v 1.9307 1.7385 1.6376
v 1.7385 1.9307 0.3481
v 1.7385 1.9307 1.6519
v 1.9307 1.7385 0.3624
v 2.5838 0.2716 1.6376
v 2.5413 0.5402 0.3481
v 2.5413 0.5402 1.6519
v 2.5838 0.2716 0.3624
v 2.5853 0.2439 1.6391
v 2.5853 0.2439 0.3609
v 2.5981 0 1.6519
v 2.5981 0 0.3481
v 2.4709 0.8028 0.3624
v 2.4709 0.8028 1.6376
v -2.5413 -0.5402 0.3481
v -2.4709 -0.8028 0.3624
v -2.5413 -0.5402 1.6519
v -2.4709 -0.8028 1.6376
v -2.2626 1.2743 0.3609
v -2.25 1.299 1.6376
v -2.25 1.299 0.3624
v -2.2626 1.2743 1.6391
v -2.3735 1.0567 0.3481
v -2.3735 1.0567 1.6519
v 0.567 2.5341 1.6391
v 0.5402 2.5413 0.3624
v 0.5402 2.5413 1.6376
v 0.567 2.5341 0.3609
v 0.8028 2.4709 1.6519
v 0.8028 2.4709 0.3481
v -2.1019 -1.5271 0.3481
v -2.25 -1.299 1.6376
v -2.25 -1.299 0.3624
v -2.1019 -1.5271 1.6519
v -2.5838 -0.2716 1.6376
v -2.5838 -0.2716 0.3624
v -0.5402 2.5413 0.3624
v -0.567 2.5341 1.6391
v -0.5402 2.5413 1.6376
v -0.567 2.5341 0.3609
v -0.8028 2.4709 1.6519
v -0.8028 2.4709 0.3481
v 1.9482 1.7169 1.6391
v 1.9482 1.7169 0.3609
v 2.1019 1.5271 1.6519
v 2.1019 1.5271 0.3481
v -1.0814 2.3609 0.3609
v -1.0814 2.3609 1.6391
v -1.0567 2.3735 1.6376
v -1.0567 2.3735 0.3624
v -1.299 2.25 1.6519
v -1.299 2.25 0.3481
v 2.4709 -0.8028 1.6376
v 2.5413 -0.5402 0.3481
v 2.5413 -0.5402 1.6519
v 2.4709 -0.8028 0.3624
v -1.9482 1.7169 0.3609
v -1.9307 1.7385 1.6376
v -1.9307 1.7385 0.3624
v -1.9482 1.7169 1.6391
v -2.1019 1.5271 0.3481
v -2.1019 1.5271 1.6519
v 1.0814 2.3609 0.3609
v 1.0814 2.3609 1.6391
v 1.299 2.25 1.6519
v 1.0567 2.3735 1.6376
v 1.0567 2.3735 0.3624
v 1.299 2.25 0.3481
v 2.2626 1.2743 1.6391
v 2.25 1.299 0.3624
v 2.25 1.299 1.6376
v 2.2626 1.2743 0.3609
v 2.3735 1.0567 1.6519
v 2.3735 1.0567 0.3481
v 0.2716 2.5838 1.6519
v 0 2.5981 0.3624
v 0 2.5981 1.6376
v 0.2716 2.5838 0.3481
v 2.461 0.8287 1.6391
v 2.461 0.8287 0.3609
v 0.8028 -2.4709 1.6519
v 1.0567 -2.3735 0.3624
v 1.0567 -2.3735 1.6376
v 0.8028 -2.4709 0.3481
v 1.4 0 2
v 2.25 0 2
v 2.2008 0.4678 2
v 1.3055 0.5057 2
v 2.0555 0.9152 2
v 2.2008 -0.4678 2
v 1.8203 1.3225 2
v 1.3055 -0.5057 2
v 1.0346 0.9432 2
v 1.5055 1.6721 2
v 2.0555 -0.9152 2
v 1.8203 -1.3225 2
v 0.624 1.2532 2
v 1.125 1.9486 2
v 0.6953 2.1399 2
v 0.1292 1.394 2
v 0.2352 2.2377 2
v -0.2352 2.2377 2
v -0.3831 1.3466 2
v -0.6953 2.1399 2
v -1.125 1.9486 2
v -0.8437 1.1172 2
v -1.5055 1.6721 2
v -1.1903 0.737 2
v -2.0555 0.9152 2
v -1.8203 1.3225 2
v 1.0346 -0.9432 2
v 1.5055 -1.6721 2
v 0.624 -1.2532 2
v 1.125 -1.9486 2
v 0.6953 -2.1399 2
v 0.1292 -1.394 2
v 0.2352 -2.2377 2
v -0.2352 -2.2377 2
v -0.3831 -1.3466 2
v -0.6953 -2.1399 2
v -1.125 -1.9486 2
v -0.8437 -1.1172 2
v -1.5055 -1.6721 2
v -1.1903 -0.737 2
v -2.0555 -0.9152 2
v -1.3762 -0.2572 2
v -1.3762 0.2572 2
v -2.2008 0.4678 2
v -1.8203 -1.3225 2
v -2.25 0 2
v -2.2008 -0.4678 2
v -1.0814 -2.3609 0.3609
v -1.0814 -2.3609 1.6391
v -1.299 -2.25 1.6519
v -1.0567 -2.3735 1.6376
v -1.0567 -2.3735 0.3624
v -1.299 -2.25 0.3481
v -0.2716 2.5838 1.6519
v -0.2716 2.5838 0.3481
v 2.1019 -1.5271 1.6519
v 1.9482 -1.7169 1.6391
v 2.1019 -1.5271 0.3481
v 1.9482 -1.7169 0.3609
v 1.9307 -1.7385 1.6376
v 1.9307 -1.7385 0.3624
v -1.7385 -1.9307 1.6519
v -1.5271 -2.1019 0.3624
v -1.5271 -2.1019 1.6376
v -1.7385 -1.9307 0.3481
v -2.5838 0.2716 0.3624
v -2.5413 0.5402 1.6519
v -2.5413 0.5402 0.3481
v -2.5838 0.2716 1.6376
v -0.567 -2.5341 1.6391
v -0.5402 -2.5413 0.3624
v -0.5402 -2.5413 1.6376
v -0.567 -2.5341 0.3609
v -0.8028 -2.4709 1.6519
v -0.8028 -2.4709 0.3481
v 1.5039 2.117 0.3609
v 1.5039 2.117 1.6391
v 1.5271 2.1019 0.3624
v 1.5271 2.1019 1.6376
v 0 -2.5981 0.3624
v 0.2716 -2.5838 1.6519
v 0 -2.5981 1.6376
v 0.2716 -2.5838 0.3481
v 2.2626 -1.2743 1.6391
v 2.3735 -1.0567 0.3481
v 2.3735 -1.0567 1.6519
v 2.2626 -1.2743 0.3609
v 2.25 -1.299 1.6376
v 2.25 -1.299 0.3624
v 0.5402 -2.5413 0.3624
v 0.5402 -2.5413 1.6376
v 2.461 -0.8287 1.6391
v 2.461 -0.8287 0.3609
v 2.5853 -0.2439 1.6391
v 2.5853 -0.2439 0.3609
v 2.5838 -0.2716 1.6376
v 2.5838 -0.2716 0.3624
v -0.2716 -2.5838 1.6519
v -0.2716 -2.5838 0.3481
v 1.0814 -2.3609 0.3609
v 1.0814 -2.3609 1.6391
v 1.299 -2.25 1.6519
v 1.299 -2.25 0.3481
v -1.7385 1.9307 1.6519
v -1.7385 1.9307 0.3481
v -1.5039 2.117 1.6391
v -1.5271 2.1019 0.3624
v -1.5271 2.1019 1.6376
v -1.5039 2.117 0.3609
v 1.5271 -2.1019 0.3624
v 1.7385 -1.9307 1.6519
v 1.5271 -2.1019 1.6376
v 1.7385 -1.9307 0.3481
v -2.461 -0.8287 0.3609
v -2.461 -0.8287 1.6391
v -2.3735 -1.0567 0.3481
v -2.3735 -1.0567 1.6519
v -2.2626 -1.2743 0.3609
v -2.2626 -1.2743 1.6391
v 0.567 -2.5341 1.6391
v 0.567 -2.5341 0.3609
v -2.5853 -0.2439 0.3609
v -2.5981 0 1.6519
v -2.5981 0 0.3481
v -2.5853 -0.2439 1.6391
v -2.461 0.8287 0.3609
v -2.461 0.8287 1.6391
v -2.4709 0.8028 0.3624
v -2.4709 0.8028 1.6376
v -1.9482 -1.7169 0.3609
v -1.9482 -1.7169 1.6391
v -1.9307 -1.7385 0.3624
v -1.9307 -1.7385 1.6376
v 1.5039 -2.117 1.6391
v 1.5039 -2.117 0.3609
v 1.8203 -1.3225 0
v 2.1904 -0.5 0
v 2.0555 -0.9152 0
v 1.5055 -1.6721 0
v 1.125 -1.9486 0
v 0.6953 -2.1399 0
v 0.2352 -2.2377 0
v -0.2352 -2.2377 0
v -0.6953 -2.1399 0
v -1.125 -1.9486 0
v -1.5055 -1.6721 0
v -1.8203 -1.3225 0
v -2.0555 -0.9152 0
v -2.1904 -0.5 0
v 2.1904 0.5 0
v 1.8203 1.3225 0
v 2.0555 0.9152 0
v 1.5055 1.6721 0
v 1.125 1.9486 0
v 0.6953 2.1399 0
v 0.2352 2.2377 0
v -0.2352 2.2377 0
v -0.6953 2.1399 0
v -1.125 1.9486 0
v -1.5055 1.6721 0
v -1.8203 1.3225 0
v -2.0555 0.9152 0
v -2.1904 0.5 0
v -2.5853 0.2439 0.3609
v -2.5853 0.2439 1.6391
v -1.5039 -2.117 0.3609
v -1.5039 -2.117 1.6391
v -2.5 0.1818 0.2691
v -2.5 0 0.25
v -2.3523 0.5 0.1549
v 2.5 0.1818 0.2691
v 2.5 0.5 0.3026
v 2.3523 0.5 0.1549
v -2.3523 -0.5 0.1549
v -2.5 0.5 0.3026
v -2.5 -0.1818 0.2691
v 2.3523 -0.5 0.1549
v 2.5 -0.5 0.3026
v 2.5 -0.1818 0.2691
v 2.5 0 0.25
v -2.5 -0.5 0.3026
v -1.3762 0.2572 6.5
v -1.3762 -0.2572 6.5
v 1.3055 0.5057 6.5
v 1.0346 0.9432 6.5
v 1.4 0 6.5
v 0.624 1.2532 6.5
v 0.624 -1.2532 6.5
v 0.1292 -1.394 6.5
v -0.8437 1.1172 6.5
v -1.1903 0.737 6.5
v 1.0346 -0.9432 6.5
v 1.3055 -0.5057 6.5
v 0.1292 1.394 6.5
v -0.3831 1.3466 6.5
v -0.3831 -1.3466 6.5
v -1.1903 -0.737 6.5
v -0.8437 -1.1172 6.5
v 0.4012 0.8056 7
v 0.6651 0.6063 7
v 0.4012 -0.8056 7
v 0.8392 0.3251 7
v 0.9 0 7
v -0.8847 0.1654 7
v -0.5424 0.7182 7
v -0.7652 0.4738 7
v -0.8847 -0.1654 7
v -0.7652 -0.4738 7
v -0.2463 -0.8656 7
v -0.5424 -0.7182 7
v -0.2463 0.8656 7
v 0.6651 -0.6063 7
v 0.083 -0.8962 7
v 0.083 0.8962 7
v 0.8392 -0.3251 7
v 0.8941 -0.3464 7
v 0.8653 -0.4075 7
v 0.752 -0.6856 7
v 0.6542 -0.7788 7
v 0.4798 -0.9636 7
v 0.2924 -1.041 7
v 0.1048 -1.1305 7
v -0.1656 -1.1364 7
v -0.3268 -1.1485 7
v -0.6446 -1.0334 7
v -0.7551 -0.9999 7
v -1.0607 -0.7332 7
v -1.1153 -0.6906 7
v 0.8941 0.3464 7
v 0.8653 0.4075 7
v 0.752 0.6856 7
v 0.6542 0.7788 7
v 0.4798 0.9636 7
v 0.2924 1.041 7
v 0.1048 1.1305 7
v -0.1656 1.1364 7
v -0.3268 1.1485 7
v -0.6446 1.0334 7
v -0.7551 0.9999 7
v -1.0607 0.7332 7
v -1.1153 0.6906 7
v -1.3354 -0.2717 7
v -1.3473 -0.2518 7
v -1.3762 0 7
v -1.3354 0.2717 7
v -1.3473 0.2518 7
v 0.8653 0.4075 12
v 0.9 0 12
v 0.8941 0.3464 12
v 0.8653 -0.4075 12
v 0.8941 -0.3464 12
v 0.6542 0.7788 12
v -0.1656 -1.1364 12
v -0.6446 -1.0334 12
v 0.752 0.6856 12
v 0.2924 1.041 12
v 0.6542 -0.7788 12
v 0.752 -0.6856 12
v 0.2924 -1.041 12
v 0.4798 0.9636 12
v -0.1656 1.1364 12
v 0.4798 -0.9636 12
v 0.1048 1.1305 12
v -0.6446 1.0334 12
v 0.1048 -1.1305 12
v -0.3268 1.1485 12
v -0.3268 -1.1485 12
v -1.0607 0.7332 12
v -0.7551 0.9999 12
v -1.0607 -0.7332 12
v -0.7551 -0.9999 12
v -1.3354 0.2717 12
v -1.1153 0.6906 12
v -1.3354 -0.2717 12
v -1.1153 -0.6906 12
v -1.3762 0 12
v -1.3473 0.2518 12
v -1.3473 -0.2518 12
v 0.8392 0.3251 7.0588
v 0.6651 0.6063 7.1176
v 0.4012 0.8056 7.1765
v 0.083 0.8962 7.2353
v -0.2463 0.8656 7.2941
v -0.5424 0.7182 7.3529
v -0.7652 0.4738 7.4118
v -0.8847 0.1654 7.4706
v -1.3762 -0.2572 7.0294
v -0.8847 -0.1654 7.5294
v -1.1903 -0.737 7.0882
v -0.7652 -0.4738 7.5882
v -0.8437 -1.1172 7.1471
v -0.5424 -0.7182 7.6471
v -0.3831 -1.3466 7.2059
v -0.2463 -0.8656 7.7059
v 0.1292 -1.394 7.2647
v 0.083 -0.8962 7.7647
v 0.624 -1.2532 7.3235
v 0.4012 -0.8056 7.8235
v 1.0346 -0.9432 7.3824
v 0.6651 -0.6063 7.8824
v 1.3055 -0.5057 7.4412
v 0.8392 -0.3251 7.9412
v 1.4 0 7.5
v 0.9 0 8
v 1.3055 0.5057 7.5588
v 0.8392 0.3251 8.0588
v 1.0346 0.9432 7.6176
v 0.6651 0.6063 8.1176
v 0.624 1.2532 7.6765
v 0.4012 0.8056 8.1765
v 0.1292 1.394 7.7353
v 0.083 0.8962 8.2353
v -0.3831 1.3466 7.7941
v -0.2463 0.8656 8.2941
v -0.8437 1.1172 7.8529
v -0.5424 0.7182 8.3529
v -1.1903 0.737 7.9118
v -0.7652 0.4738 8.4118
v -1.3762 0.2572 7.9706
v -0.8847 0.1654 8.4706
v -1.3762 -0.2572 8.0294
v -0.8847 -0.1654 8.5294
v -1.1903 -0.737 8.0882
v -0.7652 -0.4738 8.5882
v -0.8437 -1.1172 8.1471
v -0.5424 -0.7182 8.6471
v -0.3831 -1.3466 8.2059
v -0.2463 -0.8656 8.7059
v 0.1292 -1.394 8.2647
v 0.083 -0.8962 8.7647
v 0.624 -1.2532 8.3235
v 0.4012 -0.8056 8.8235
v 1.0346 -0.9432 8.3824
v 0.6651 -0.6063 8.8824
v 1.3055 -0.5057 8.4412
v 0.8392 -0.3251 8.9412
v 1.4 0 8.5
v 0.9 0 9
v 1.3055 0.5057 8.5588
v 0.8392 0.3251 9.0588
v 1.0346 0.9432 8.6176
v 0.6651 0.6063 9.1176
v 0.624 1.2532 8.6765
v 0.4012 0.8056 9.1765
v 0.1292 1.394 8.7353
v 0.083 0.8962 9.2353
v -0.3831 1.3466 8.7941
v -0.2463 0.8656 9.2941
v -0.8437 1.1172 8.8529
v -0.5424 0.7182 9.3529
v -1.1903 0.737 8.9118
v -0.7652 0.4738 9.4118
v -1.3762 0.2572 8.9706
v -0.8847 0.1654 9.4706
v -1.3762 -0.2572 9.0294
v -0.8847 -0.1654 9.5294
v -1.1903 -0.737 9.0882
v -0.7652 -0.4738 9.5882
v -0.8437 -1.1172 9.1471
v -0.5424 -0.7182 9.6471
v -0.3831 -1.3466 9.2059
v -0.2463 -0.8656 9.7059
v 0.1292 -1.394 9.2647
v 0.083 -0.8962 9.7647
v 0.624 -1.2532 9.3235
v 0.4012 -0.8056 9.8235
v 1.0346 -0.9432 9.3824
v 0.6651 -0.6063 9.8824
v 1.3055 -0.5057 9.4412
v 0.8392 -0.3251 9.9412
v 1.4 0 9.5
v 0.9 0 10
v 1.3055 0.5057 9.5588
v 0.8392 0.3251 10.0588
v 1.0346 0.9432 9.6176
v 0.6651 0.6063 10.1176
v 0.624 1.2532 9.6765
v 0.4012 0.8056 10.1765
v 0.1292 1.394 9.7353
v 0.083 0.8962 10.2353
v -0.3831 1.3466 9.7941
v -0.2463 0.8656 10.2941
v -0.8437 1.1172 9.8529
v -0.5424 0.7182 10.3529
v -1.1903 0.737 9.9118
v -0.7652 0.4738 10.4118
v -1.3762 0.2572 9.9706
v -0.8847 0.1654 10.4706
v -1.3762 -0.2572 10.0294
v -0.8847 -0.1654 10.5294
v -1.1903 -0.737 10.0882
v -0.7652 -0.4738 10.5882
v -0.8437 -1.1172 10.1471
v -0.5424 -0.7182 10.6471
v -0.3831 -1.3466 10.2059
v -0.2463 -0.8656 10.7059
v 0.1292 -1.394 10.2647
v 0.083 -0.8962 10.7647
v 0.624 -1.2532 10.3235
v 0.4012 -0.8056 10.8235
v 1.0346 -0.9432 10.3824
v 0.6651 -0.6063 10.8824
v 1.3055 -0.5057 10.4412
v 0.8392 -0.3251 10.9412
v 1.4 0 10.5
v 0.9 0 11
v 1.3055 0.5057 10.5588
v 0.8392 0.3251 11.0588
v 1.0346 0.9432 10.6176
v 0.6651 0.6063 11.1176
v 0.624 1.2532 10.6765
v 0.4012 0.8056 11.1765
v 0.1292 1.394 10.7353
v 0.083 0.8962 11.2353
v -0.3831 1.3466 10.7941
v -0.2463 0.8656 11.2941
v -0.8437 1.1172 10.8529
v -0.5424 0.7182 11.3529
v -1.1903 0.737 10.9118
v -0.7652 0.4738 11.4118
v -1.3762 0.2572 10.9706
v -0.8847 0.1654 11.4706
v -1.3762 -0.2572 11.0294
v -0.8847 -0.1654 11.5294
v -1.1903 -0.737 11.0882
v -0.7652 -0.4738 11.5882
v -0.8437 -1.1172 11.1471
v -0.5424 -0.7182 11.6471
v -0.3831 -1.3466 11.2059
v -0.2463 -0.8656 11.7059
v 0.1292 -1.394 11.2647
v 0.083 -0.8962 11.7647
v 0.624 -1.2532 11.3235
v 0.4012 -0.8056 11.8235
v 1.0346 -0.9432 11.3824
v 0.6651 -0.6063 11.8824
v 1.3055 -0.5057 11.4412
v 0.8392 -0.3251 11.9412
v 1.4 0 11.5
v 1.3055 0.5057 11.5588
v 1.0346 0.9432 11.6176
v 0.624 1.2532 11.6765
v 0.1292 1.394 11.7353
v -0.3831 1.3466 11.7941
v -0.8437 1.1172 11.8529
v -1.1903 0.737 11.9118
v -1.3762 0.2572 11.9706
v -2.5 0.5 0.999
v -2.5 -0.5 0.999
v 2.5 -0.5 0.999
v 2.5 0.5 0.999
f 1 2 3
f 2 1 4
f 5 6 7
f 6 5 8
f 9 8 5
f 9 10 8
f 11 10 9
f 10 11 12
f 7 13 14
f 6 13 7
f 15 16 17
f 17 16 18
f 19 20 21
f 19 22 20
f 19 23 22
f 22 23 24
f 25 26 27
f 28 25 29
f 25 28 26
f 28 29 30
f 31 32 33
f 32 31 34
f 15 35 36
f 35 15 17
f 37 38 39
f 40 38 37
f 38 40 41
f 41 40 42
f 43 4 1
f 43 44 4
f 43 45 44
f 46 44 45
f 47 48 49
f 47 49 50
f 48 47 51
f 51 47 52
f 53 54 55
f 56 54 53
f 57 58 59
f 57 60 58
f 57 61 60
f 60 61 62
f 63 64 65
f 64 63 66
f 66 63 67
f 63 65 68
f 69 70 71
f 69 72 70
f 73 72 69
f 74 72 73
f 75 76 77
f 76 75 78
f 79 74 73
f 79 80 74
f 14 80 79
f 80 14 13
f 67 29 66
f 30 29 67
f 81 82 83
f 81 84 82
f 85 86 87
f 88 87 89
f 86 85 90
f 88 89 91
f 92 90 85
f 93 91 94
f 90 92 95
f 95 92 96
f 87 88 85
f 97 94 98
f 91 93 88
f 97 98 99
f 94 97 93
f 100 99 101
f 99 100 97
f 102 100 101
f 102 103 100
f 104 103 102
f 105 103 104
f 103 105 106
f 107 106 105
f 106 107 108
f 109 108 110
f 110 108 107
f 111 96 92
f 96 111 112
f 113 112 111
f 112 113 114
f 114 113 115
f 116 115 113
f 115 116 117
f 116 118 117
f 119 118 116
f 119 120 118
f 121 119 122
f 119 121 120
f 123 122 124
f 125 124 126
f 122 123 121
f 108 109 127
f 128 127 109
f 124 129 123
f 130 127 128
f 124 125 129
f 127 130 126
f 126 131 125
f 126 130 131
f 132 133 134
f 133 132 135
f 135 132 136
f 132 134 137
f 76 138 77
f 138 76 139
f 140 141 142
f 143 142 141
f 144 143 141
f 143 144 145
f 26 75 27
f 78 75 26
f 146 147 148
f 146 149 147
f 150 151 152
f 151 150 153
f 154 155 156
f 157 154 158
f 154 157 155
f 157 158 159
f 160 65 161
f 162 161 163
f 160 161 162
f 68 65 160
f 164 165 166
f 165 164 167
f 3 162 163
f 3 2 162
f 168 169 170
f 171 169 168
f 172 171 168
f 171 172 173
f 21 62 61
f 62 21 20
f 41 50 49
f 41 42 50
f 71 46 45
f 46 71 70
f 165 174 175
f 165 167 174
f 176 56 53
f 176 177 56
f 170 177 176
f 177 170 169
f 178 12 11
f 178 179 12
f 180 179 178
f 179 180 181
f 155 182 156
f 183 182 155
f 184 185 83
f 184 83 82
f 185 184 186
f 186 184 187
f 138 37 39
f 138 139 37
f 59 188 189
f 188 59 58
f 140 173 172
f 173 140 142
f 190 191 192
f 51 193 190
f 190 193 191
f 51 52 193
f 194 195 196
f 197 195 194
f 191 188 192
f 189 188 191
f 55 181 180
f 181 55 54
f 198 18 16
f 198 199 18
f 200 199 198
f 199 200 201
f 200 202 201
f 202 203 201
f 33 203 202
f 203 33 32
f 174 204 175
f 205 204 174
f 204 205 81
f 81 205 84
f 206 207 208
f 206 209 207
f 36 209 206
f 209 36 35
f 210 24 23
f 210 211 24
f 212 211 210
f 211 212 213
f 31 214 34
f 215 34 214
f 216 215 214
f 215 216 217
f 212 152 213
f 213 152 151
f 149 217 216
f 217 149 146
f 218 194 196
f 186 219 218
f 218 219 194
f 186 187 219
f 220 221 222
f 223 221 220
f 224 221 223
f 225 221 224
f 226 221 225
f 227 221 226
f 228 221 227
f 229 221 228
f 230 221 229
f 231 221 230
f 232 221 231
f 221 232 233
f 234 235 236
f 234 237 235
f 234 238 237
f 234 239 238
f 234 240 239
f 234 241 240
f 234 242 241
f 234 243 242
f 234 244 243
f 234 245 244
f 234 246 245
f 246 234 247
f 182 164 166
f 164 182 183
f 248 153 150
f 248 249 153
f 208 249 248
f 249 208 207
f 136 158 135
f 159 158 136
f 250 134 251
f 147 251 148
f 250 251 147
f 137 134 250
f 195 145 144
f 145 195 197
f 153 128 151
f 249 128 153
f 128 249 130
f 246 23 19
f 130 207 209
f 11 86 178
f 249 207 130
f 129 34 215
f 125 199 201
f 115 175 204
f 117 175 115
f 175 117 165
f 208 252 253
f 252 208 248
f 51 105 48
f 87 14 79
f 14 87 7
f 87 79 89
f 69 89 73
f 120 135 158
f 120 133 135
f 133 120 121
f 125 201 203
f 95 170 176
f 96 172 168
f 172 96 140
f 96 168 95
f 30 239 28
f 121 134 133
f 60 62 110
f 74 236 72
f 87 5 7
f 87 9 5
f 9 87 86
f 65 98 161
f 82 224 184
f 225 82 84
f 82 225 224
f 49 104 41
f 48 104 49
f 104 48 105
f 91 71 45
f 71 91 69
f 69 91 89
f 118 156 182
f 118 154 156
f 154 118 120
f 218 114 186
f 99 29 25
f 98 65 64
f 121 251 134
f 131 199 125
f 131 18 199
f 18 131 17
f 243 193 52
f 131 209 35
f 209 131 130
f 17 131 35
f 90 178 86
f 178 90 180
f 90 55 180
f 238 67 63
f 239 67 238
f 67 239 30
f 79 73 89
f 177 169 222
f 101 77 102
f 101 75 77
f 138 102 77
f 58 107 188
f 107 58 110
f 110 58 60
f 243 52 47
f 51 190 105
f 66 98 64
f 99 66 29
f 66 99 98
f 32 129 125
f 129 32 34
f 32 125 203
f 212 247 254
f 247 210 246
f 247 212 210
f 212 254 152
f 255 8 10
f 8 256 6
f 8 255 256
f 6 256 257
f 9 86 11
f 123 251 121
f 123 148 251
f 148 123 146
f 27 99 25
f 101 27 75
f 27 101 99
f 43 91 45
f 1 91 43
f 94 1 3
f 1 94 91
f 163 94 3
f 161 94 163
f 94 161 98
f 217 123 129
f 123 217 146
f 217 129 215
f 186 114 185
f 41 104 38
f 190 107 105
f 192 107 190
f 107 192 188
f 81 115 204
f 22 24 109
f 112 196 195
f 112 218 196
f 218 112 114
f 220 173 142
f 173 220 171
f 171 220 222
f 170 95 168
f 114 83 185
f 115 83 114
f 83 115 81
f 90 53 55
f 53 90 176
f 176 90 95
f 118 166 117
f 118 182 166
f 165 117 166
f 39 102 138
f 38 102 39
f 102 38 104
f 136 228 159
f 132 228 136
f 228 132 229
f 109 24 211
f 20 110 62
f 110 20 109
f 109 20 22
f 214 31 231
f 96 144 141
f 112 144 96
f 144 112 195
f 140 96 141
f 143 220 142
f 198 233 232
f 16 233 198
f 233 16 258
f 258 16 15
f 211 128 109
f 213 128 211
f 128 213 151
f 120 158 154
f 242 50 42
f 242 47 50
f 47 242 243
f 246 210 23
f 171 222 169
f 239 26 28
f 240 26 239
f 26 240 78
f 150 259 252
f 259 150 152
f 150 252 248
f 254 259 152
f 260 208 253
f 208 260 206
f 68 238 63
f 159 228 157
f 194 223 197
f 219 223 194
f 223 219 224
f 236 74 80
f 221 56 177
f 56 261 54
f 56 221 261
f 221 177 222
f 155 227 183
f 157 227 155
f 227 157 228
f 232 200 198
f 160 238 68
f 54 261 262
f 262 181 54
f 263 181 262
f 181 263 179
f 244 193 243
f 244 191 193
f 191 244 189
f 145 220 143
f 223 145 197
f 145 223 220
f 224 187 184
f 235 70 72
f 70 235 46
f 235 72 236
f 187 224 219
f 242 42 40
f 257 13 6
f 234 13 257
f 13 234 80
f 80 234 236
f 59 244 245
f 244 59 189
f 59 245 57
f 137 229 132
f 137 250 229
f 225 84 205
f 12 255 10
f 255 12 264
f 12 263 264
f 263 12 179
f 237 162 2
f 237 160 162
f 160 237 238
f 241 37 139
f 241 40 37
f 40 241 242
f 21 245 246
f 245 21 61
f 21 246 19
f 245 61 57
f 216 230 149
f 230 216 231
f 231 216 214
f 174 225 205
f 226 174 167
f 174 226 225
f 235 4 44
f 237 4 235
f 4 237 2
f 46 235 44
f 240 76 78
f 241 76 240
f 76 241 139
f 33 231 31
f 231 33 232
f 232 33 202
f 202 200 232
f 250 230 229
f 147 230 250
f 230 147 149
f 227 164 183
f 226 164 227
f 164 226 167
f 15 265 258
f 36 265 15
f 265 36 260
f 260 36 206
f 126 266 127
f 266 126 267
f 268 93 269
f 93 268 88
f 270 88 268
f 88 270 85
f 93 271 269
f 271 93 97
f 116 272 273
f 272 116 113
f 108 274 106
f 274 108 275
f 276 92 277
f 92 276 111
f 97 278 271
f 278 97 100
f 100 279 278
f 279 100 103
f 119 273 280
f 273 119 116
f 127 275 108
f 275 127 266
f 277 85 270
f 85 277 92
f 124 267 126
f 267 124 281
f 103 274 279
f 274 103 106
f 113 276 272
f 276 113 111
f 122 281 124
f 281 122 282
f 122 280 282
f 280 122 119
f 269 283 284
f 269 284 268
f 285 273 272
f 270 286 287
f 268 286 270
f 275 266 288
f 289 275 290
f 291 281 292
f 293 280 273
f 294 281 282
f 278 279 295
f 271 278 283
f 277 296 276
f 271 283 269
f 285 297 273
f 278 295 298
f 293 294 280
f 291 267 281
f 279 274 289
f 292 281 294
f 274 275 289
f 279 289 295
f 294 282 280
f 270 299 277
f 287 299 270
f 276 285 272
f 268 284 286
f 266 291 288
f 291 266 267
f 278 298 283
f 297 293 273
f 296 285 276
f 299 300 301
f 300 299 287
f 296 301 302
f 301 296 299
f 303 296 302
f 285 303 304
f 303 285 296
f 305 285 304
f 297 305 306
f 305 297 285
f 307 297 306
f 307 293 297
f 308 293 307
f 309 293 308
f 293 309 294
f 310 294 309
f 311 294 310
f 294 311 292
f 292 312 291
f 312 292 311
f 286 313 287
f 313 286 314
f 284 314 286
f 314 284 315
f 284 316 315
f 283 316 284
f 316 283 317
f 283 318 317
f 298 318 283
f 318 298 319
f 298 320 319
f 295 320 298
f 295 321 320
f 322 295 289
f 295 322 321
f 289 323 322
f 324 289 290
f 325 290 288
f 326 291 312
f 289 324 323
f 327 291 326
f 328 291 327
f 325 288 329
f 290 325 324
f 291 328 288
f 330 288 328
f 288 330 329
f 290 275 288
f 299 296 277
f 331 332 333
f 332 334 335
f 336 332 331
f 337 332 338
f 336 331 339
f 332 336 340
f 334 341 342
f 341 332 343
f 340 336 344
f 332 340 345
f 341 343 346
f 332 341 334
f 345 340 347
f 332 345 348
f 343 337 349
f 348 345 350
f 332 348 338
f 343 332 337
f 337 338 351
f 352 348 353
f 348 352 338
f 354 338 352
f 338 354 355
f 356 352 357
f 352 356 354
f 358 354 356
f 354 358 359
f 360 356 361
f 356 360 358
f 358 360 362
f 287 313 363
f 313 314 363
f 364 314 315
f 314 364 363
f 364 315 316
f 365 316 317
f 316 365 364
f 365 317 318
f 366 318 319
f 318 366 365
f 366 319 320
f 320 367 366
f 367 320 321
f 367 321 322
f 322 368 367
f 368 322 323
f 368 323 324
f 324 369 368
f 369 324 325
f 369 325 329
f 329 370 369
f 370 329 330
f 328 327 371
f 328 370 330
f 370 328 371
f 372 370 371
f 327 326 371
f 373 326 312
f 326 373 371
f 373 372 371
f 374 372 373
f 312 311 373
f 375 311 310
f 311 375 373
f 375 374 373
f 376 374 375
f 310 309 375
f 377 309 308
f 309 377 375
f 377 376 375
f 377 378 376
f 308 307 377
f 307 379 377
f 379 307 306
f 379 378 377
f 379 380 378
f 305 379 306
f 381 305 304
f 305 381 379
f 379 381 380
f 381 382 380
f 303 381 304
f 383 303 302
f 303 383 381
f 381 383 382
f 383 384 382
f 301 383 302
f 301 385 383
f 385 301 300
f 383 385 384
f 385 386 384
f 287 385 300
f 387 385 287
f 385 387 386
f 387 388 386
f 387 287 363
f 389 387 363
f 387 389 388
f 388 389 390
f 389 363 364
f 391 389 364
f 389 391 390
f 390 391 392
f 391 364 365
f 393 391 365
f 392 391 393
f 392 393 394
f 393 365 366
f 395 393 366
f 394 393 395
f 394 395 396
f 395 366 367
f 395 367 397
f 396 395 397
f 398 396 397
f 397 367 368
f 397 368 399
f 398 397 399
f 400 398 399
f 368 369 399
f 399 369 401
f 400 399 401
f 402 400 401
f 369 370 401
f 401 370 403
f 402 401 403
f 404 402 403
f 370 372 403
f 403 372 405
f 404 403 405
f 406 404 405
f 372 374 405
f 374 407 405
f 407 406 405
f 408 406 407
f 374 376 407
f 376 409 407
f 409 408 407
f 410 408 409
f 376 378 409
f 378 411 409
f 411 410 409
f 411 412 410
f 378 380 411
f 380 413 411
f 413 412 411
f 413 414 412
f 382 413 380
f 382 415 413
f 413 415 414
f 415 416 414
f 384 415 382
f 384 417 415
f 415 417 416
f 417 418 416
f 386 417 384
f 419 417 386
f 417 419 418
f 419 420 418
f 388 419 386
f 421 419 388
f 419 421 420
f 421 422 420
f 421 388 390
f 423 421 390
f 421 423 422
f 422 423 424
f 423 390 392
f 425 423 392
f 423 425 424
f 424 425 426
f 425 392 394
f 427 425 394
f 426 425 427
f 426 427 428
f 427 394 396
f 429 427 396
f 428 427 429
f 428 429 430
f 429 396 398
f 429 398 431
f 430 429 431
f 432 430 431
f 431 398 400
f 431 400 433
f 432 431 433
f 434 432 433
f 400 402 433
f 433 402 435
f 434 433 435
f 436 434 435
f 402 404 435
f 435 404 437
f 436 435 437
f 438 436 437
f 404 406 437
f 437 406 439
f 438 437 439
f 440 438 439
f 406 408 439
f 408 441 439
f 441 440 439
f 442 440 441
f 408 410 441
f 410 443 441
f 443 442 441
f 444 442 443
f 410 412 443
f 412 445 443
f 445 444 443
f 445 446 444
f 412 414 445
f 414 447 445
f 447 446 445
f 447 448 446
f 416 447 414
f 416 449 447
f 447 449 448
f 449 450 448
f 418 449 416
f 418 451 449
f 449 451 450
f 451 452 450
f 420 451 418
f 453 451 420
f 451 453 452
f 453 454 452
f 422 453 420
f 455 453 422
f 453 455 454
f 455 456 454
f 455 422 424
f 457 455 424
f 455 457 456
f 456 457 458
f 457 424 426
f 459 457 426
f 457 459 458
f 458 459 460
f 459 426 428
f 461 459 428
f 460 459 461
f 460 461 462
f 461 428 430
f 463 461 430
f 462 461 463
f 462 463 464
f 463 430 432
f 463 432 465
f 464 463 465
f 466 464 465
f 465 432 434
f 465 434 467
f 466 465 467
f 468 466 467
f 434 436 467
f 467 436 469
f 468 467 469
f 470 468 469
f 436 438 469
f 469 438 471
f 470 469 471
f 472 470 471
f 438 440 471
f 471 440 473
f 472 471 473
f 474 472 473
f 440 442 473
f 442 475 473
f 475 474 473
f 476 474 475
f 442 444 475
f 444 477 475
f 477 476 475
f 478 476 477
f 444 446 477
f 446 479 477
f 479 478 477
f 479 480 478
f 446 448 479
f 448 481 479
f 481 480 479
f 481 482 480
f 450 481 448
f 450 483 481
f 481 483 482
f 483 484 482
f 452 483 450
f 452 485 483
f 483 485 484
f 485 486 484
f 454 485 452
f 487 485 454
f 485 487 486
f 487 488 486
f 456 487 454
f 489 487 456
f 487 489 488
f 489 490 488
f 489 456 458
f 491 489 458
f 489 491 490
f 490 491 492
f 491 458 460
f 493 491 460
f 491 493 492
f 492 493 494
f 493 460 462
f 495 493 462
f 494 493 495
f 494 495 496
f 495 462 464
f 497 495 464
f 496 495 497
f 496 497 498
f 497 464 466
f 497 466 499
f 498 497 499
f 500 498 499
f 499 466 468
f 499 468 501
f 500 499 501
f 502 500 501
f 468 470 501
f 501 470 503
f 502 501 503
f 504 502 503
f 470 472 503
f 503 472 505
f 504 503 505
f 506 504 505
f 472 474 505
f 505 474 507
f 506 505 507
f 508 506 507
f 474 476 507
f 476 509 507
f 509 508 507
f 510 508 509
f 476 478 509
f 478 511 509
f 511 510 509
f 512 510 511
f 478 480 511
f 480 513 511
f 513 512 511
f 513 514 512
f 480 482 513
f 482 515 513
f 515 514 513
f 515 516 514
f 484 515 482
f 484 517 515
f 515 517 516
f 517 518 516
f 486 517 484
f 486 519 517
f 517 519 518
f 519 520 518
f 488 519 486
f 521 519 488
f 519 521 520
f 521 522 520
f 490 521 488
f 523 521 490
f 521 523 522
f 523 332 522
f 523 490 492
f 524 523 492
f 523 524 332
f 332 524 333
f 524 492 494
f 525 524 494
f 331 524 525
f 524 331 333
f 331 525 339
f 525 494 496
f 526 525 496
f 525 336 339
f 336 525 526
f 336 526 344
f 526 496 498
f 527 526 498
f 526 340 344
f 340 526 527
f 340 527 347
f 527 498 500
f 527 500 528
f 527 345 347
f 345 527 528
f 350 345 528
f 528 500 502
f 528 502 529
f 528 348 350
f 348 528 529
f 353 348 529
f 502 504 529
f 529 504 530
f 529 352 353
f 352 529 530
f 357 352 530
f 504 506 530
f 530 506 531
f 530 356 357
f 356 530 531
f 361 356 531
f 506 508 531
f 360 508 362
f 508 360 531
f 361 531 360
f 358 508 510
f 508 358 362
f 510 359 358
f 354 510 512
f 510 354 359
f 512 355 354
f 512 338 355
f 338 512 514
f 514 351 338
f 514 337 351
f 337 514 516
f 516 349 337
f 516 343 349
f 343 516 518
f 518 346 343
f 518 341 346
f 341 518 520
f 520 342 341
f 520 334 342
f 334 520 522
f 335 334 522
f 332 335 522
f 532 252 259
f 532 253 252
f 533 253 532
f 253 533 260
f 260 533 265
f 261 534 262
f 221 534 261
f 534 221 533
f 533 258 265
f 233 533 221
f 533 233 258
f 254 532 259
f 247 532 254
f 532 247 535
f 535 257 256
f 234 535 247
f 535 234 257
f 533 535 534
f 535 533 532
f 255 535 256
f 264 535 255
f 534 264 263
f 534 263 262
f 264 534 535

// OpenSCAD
/* 'Nut Job' nut, bolt, washer and threaded rod factory by Mike Thompson 1/12/2013, Thingiverse: mike_linus
 *
 * Licensing: This work is licensed under a Creative Commons Attribution-NonCommercial-ShareAlike 3.0 Australia License.
 * Further information is available here - http://creativecommons.org/licenses/by-nc-sa/3.0/au/deed.en_GB
 *
 * v2 8/12/2013 - added socket head types
 * v3 2/11/2014 - adjusted wing nut algorithm for better behaviour with unusual nut sizes and added ISO262 metric references
 * v4 31/12/2014 - added optional texture to socket heads, added ability to change the number of facets for a hex head
 * and adjusted wingnut base level on certain nut sizes
 * v5 11/1/2015 - added phillips and slot drive types and improved texture handling 
 * v6 21/2/2015 - added wing ratio to wingnuts 
 * v7 6/3/2016 - added extended options to control number of facets on nuts, square sockets (or any number of facets) and socket depth control
 * v8 1/1/2017 - modified library code to remove dependence on deprecated 'assign' statement
 * 
 * This script generates nuts, bolts, washers and threaded rod using the library 
 * script: polyScrewThead.scad (modified/updated version polyScrewThread_r1.scad)
 * http://www.thingiverse.com/thing:8796, CC Public Domain
 *
 * Defaults are for a 8mm diameter bolts, rod, matching nuts and wing nuts that work well together
 * without cleanup or modification. Some default parameters such as the nut outer diameter are deliberately
 * altered to produce a snug fit that can still be hand tightened. This may need to be altered
 * depending on individual printer variances, slicing tools, filament etc. Suggest printing a matching
 * bolt and nut and adjusting as necessary.  Note: slow print speeds, low temperatures and solid
 * fill are recommended for best results.
 */

/* [Component Type] */

type						    = "bolt";//[nut,bolt,rod,washer]

/* [Bolt and Rod Options] */

//Head type - Hex, Socket Cap, Button Socket Cap or Countersunk Socket Cap (ignored for Rod)
head_type              			= "socket";//[hex,socket,button,countersunk]
//Drive type - Socket, Phillips, Slot (ignored for Hex head type and Rod)
drive_type              		= "slot";//[socket,phillips,slot]
//Distance between flats for the hex head or diameter for socket or button head (ignored for Rod)
head_diameter    				= 4.5;	
//Height of the head (ignored for Rod)
head_height  					= 2;	
//Diameter of drive type (ignored for Hex head and Rod)
drive_diameter					= 5;	
//Width of slot aperture for phillips or slot drive types
slot_width					    = 1;
//Depth of slot aperture for slot drive type
slot_depth 					    = 1;
//Surface texture (socket head only)
texture                         = "exclude";//[include,exclude]
//Outer diameter of the thread
thread_outer_diameter           = 2.8;		
//Thread step or Pitch (2mm works well for most applications ref. ISO262: M3=0.5,M4=0.7,M5=0.8,M6=1,M8=1.25,M10=1.5)
thread_step    					= 1;
//Step shape degrees (45 degrees is optimised for most printers ref. ISO262: 30 degrees)
step_shape_degrees 				= 45;	
//Length of the threaded section
thread_length  					= 5;	
//Countersink in both ends
countersink  					= 4;	
//Length of the non-threaded section
non_thread_length				= 5;	
//Diameter for the non-threaded section (-1: Same as inner diameter of the thread, 0: Same as outer diameter of the thread, value: The given value)
non_thread_diameter				= 0;	

/* [Nut Options] */

//Type: Normal or WingNut
nut_type	                    = "normal";//[normal,wingnut]
//Distance between flats for the hex nut
nut_diameter    				= 12;	
//Height of the nut
nut_height	  				    = 6;	
//Outer diameter of the bolt thread to match (usually set about 1mm larger than bolt diameter to allow easy fit - adjust to personal preferences) 
nut_thread_outer_diameter     	= 9;		
//Thread step or Pitch (2mm works well for most applications ref. ISO262: M3=0.5,M4=0.7,M5=0.8,M6=1,M8=1.25,M10=1.5)
nut_thread_step    				= 2;
//Step shape degrees (45 degrees is optimised for most printers ref. ISO262: 30 degrees)
nut_step_shape_degrees 			= 45;	
//Wing radius ratio.  The proportional radius of the wing on the wing nut compared to the nut height value (default = 1)
wing_ratio                      = 1;
wing_radius=wing_ratio * nut_height;

/* [Washer Options] */

//Inner Diameter (suggest making diameter slightly larger than bolt diameter)
inner_diameter					= 8;
//Outer Diameter
outer_diameter					= 14;
//Thickness
thickness					    = 2;

/* [Extended Options] */

//Number of facets for hex head type or nut. Default is 6 for standard hex head and nut
facets                          = 6;
//Number of facets for hole in socket head. Default is 6 for standard hex socket
socket_facets                   = 6;
//Depth of hole in socket head. Default is 3.5
socket_depth                    = 3.5;
//Resolution (lower values for higher resolution, but may slow rendering)
resolution    					= 0.5;	
nut_resolution    				= resolution;

//Hex Bolt
if (type=="bolt" && head_type=="hex")
{
	hex_screw(thread_outer_diameter,thread_step,step_shape_degrees,thread_length,resolution,countersink,head_diameter,head_height,non_thread_length,non_thread_diameter);
}

//Rod
if (type=="rod")
{
	hex_screw(thread_outer_diameter,thread_step,step_shape_degrees,thread_length,resolution,countersink,head_diameter,0,non_thread_length,non_thread_diameter);
}

//Hex Nut (normally slightly larger outer diameter to fit on bolt correctly)
if (type=="nut" && nut_type=="normal")
{
	hex_nut(nut_diameter,nut_height,nut_thread_step,nut_step_shape_degrees,nut_thread_outer_diameter,nut_resolution);
}

//Wing Nut variation of hex nut. Cylinders added to each side of nut for easy turning - ideal for quick release applications
if (type=="nut" && nut_type=="wingnut")
{
	rotate([0,0,30])hex_nut(nut_diameter,nut_height,nut_thread_step,nut_step_shape_degrees,nut_thread_outer_diameter,nut_resolution); //nut	
	translate([(nut_diameter/2)+wing_radius-1,1.5,wing_radius/2+1])rotate([90,0,0])wing(); //attach wing
	mirror(1,0,0)translate([(nut_diameter/2)+wing_radius-1,1.5,wing_radius/2+1])rotate([90,0,0])wing(); //attach wing
}

module wing()
{
	difference()
	{
		cylinder(r=wing_radius,h=3,$fn=64); //cylinder
		union()
		{
			translate([-wing_radius,-wing_radius-1,-0.5])cube([wing_radius*2,wing_radius/2,wing_radius*2]); //remove overhang so flush with base of nut		
			rotate([0,0,90])translate([-wing_radius,wing_radius-1,-0.5])cube([wing_radius*2,wing_radius/2,wing_radius*2]); //remove overhangs so flush with side of nut		
		}
	}
}

//Washer
if (type=="washer")
{
	difference()
	{
		cylinder(r=outer_diameter/2,h=thickness,$fn=100);
		translate([0,0,-0.1])cylinder(r=inner_diameter/2,h=thickness+0.2,$fn=100);
	}
}

//Socket Head Bolt
if (type=="bolt" && head_type!="hex")
{
	socket_screw(thread_outer_diameter,thread_step,step_shape_degrees,thread_length,resolution,countersink,head_diameter,head_height,non_thread_length,non_thread_diameter);
}

module phillips_base()
{
	linear_extrude(slot_width)polygon(points=[[0,0],[(drive_diameter-slot_width)/2,9/5*(drive_diameter-slot_width)/2],[(drive_diameter+slot_width)/2,9/5*(drive_diameter-slot_width)/2],[drive_diameter,0]]);
	translate([(drive_diameter-slot_width)/2,0,(drive_diameter+slot_width)/2])rotate([0,90,0])linear_extrude(slot_width)polygon(points=[[0,0],[(drive_diameter-slot_width)/2,9/5*(drive_diameter-slot_width)/2],[(drive_diameter+slot_width)/2,9/5*(drive_diameter-slot_width)/2],[drive_diameter,0]]);
}

module phillips_fillet()
{
	union()
	{
		translate([-(drive_diameter-slot_width)/2-(slot_width/2),slot_width/2,0])rotate([90,0,0])phillips_base();
		translate([0,0,9/5*(drive_diameter-slot_width)/2])union()
		{
			inner_curve();
			rotate([0,0,90])inner_curve();
			rotate([0,0,180])inner_curve();
			rotate([0,0,270])inner_curve();
		}
	}
}

module inner_curve()
{
	translate([slot_width/2,-slot_width/2,0])rotate([0,90,0])linear_fillet(9/5*(drive_diameter-slot_width)/2,drive_diameter/10);
}

//basic 2d profile used for fillet shape
module profile(radius)
{
  difference()
  {
    square(radius);
    circle(r=radius);
  }
}

//linear fillet for use along straight edges
module linear_fillet(length,profile_radius)
{
	translate([0,-profile_radius,profile_radius])rotate([0,90,0])linear_extrude(height=length,convexity=10)profile(profile_radius);
}

module phillips_drive()
{
	intersection()
	{
		phillips_fillet();
		cylinder(9/5*(drive_diameter-slot_width)/2,drive_diameter/2+(slot_width/2),slot_width/2);
	}
}

module socket_screw(od,st,lf0,lt,rs,cs,df,hg,ntl,ntd)
{
    ntr=od/2-(st/2)*cos(lf0)/sin(lf0);
	$fn=60;

	difference()
	{
    		union()
    		{
        		if (head_type=="socket")
				{
					socket_head(hg,df);
				}
			
        		if (head_type=="button")
				{
					button_head(hg,df);				
				}

        		if (head_type=="countersunk")
				{
					countersunk_head(hg,df);				
				}

        		translate([0,0,hg])
        		if ( ntl == 0 )
        		{
          		cylinder(h=0.01, r=ntr, center=true);
        		}
        		else
        		{
            		if ( ntd == -1 )
            		{
                		cylinder(h=ntl+0.01, r=ntr, $fn=floor(od*PI/rs), center=false);
            		}
            		else if ( ntd == 0 )
            		{
                		union()
                		{
                    		cylinder(h=ntl-st/2,r=od/2, $fn=floor(od*PI/rs), center=false);
                    		translate([0,0,ntl-st/2])
                    		cylinder(h=st/2,
                             r1=od/2, r2=ntr, 
                             $fn=floor(od*PI/rs), center=false);
                		}
            		}
            		else
            		{
                		cylinder(h=ntl, r=ntd/2, $fn=ntd*PI/rs, center=false);
            		}
        		}
        		translate([0,0,ntl+hg]) screw_thread(od,st,lf0,lt,rs,cs);
    		}
		//create opening for specific drive type
		if (drive_type=="socket")
		{
			cylinder(r=drive_diameter/2,h=socket_depth,$fn=socket_facets); //socket
			#translate([0,0,socket_depth])cylinder(r1=drive_diameter/2,r2=0,h=drive_diameter/3,$fn=socket_facets); //socket tapers at base to allow printing without bridging and improve socket grip
		}
		else
		{
			if (drive_type=="phillips")
			{
				translate([0,0,-0.001])phillips_drive();
			}
			else //slot
			{
				translate([-(drive_diameter)/2,slot_width/2,-0.001])rotate([90,0,0])cube([drive_diameter,slot_depth,slot_width]);
			}	
		}
	}
}

module socket_head(hg,df)
{
	texture_points=2*PI*(head_diameter/2);
	texture_offset=head_diameter/18;
	texture_radius=head_diameter/24;

	rd0=df/2/sin(60);
	x0=0;	x1=df/2;	x2=x1+hg/2;
	y0=0;	y1=hg/2;	y2=hg;

	intersection()
	{
	   	cylinder(h=hg, r=rd0, $fn=60, center=false);
		rotate_extrude(convexity=10, $fn=6*round(df*PI/6/0.5))
		polygon([ [x0,y0],[x1,y0],[x2,y1],[x1,y2],[x0,y2] ]);
	}

	if (texture=="include") //add texture to socket head. Adjust texture density and size using texture variables above 
	{
		for (i= [1:texture_points])
		{
			translate([cos(360/texture_points*i)*(head_diameter/2+texture_offset), sin(360/texture_points*i)*(head_diameter/2+texture_offset), 1 ])
			rotate([0,0,360/texture_points*i])cylinder(r=texture_radius,h=head_height*0.6,$fn=3);
		}
	}

}

module button_head(hg,df)
{
	rd0=df/2/sin(60);
	x0=0;	x1=df/2;	x2=x1+hg/2;
	y0=0;	y1=hg/2;	y2=hg;

	intersection()
	{
	   	cylinder(h=hg, r1=drive_diameter/2 + 1, r2=rd0, $fn=60, center=false);
		rotate_extrude(convexity=10, $fn=6*round(df*PI/6/0.5))
		polygon([ [x0,y0],[x1,y0],[x2,y1],[x1,y2],[x0,y2] ]);
	}
}

module countersunk_head(hg,df)
{
	rd0=df/2/sin(60);
	x0=0;	x1=df/2;	x2=x1+hg/2;
	y0=0;	y1=hg/2;	y2=hg;

	intersection()
	{
	   cylinder(h=hg, r1=rd0, r2=thread_outer_diameter/2-0.5, $fn=60, center=false);

		rotate_extrude(convexity=10, $fn=6*round(df*PI/6/0.5))
		polygon([ [x0,y0],[x1,y0],[x2,y1],[x1,y2],[x0,y2] ]);
	}
}

/* Library included below to allow customizer functionality    
 *   
 * polyScrewThread_r1.scad    by aubenc @ Thingiverse
 *
 * Modified by mike_mattala @ Thingiverse 1/1/2017 to remove deprecated assign
 * 
 * This script contains the library modules that can be used to generate
 * threaded rods, screws and nuts.
 *
 * http://www.thingiverse.com/thing:8796
 *
 * CC Public Domain
 */

module screw_thread(od,st,lf0,lt,rs,cs)
{
    or=od/2;
    ir=or-st/2*cos(lf0)/sin(lf0);
    pf=2*PI*or;
    sn=floor(pf/rs);
    lfxy=360/sn;
    ttn=round(lt/st+1);
    zt=st/sn;

    intersection()
    {
        if (cs >= -1)
        {
           thread_shape(cs,lt,or,ir,sn,st);
        }

        full_thread(ttn,st,sn,zt,lfxy,or,ir);
    }
}

module hex_nut(df,hg,sth,clf,cod,crs)
{

    difference()
    {
        hex_head(hg,df);

        hex_countersink_ends(sth/2,cod,clf,crs,hg);

        screw_thread(cod,sth,clf,hg,crs,-2);
    }
}


module hex_screw(od,st,lf0,lt,rs,cs,df,hg,ntl,ntd)
{
    ntr=od/2-(st/2)*cos(lf0)/sin(lf0);

    union()
    {
        hex_head(hg,df);

        translate([0,0,hg])
        if ( ntl == 0 )
        {
            cylinder(h=0.01, r=ntr, center=true);
        }
        else
        {
            if ( ntd == -1 )
            {
                cylinder(h=ntl+0.01, r=ntr, $fn=floor(od*PI/rs), center=false);
            }
            else if ( ntd == 0 )
            {
                union()
                {
                    cylinder(h=ntl-st/2,
                             r=od/2, $fn=floor(od*PI/rs), center=false);

                    translate([0,0,ntl-st/2])
                    cylinder(h=st/2,
                             r1=od/2, r2=ntr, 
                             $fn=floor(od*PI/rs), center=false);
                }
            }
            else
            {
                cylinder(h=ntl, r=ntd/2, $fn=ntd*PI/rs, center=false);
            }
        }

        translate([0,0,ntl+hg]) screw_thread(od,st,lf0,lt,rs,cs);
    }
}

module hex_screw_0(od,st,lf0,lt,rs,cs,df,hg,ntl,ntd)
{
    ntr=od/2-(st/2)*cos(lf0)/sin(lf0);

    union()
    {
        hex_head_0(hg,df);

        translate([0,0,hg])
        if ( ntl == 0 )
        {
            cylinder(h=0.01, r=ntr, center=true);
        }
        else
        {
            if ( ntd == -1 )
            {
                cylinder(h=ntl+0.01, r=ntr, $fn=floor(od*PI/rs), center=false);
            }
            else if ( ntd == 0 )
            {
                union()
                {
                    cylinder(h=ntl-st/2,
                             r=od/2, $fn=floor(od*PI/rs), center=false);

                    translate([0,0,ntl-st/2])
                    cylinder(h=st/2,
                             r1=od/2, r2=ntr, 
                             $fn=floor(od*PI/rs), center=false);
                }
            }
            else
            {
                cylinder(h=ntl, r=ntd/2, $fn=ntd*PI/rs, center=false);
            }
        }

        translate([0,0,ntl+hg]) screw_thread(od,st,lf0,lt,rs,cs);
    }
}

module thread_shape(cs,lt,or,ir,sn,st)
{
    if ( cs == 0 )
    {
        cylinder(h=lt, r=or, $fn=sn, center=false);
    }
    else
    {
        union()
        {
            translate([0,0,st/2])
              cylinder(h=lt-st+0.005, r=or, $fn=sn, center=false);

            if ( cs == -1 || cs == 2 )
            {
                cylinder(h=st/2, r1=ir, r2=or, $fn=sn, center=false);
            }
            else
            {
                cylinder(h=st/2, r=or, $fn=sn, center=false);
            }

            translate([0,0,lt-st/2])
            if ( cs == 1 || cs == 2 )
            {
                  cylinder(h=st/2, r1=or, r2=ir, $fn=sn, center=false);
            }
            else
            {
                cylinder(h=st/2, r=or, $fn=sn, center=false);
            }
        }
    }
}

module full_thread(ttn,st,sn,zt,lfxy,or,ir)
{
  if(ir >= 0.2)
  {
    for(i=[0:ttn-1])
    {
        for(j=[0:sn-1])
        {
			pt = [[0,0,i*st-st],
                 [ir*cos(j*lfxy),     ir*sin(j*lfxy),     i*st+j*zt-st       ],
                 [ir*cos((j+1)*lfxy), ir*sin((j+1)*lfxy), i*st+(j+1)*zt-st   ],
				 [0,0,i*st],
                 [or*cos(j*lfxy),     or*sin(j*lfxy),     i*st+j*zt-st/2     ],
                 [or*cos((j+1)*lfxy), or*sin((j+1)*lfxy), i*st+(j+1)*zt-st/2 ],
                 [ir*cos(j*lfxy),     ir*sin(j*lfxy),     i*st+j*zt          ],
                 [ir*cos((j+1)*lfxy), ir*sin((j+1)*lfxy), i*st+(j+1)*zt      ],
                 [0,0,i*st+st]];
               
            polyhedron(points=pt,faces=[[1,0,3],[1,3,6],[6,3,8],[1,6,4], //changed triangles to faces (to be deprecated)
										[0,1,2],[1,4,2],[2,4,5],[5,4,6],[5,6,7],[7,6,8],
										[7,8,3],[0,2,3],[3,2,7],[7,2,5]	]);
        }
    }
  }
  else
  {
    echo("Step Degrees too agresive, the thread will not be made!!");
    echo("Try to increase de value for the degrees and/or...");
    echo(" decrease the pitch value and/or...");
    echo(" increase the outer diameter value.");
  }
}

module hex_head(hg,df)
{
	rd0=df/2/sin(60);
	x0=0;	x1=df/2;	x2=x1+hg/2;
	y0=0;	y1=hg/2;	y2=hg;

	intersection()
	{
	   cylinder(h=hg, r=rd0, $fn=facets, center=false);

		rotate_extrude(convexity=10, $fn=6*round(df*PI/6/0.5))
		polygon([ [x0,y0],[x1,y0],[x2,y1],[x1,y2],[x0,y2] ]);
	}
}

module hex_head_0(hg,df)
{
    cylinder(h=hg, r=df/2/sin(60), $fn=6, center=false);
}

module hex_countersink_ends(chg,cod,clf,crs,hg)
{
    translate([0,0,-0.1])
    cylinder(h=chg+0.01, 
             r1=cod/2, 
             r2=cod/2-(chg+0.1)*cos(clf)/sin(clf),
             $fn=floor(cod*PI/crs), center=false);

    translate([0,0,hg-chg+0.1])
    cylinder(h=chg+0.01, 
             r1=cod/2-(chg+0.1)*cos(clf)/sin(clf),
             r2=cod/2, 
             $fn=floor(cod*PI/crs), center=false);
}
